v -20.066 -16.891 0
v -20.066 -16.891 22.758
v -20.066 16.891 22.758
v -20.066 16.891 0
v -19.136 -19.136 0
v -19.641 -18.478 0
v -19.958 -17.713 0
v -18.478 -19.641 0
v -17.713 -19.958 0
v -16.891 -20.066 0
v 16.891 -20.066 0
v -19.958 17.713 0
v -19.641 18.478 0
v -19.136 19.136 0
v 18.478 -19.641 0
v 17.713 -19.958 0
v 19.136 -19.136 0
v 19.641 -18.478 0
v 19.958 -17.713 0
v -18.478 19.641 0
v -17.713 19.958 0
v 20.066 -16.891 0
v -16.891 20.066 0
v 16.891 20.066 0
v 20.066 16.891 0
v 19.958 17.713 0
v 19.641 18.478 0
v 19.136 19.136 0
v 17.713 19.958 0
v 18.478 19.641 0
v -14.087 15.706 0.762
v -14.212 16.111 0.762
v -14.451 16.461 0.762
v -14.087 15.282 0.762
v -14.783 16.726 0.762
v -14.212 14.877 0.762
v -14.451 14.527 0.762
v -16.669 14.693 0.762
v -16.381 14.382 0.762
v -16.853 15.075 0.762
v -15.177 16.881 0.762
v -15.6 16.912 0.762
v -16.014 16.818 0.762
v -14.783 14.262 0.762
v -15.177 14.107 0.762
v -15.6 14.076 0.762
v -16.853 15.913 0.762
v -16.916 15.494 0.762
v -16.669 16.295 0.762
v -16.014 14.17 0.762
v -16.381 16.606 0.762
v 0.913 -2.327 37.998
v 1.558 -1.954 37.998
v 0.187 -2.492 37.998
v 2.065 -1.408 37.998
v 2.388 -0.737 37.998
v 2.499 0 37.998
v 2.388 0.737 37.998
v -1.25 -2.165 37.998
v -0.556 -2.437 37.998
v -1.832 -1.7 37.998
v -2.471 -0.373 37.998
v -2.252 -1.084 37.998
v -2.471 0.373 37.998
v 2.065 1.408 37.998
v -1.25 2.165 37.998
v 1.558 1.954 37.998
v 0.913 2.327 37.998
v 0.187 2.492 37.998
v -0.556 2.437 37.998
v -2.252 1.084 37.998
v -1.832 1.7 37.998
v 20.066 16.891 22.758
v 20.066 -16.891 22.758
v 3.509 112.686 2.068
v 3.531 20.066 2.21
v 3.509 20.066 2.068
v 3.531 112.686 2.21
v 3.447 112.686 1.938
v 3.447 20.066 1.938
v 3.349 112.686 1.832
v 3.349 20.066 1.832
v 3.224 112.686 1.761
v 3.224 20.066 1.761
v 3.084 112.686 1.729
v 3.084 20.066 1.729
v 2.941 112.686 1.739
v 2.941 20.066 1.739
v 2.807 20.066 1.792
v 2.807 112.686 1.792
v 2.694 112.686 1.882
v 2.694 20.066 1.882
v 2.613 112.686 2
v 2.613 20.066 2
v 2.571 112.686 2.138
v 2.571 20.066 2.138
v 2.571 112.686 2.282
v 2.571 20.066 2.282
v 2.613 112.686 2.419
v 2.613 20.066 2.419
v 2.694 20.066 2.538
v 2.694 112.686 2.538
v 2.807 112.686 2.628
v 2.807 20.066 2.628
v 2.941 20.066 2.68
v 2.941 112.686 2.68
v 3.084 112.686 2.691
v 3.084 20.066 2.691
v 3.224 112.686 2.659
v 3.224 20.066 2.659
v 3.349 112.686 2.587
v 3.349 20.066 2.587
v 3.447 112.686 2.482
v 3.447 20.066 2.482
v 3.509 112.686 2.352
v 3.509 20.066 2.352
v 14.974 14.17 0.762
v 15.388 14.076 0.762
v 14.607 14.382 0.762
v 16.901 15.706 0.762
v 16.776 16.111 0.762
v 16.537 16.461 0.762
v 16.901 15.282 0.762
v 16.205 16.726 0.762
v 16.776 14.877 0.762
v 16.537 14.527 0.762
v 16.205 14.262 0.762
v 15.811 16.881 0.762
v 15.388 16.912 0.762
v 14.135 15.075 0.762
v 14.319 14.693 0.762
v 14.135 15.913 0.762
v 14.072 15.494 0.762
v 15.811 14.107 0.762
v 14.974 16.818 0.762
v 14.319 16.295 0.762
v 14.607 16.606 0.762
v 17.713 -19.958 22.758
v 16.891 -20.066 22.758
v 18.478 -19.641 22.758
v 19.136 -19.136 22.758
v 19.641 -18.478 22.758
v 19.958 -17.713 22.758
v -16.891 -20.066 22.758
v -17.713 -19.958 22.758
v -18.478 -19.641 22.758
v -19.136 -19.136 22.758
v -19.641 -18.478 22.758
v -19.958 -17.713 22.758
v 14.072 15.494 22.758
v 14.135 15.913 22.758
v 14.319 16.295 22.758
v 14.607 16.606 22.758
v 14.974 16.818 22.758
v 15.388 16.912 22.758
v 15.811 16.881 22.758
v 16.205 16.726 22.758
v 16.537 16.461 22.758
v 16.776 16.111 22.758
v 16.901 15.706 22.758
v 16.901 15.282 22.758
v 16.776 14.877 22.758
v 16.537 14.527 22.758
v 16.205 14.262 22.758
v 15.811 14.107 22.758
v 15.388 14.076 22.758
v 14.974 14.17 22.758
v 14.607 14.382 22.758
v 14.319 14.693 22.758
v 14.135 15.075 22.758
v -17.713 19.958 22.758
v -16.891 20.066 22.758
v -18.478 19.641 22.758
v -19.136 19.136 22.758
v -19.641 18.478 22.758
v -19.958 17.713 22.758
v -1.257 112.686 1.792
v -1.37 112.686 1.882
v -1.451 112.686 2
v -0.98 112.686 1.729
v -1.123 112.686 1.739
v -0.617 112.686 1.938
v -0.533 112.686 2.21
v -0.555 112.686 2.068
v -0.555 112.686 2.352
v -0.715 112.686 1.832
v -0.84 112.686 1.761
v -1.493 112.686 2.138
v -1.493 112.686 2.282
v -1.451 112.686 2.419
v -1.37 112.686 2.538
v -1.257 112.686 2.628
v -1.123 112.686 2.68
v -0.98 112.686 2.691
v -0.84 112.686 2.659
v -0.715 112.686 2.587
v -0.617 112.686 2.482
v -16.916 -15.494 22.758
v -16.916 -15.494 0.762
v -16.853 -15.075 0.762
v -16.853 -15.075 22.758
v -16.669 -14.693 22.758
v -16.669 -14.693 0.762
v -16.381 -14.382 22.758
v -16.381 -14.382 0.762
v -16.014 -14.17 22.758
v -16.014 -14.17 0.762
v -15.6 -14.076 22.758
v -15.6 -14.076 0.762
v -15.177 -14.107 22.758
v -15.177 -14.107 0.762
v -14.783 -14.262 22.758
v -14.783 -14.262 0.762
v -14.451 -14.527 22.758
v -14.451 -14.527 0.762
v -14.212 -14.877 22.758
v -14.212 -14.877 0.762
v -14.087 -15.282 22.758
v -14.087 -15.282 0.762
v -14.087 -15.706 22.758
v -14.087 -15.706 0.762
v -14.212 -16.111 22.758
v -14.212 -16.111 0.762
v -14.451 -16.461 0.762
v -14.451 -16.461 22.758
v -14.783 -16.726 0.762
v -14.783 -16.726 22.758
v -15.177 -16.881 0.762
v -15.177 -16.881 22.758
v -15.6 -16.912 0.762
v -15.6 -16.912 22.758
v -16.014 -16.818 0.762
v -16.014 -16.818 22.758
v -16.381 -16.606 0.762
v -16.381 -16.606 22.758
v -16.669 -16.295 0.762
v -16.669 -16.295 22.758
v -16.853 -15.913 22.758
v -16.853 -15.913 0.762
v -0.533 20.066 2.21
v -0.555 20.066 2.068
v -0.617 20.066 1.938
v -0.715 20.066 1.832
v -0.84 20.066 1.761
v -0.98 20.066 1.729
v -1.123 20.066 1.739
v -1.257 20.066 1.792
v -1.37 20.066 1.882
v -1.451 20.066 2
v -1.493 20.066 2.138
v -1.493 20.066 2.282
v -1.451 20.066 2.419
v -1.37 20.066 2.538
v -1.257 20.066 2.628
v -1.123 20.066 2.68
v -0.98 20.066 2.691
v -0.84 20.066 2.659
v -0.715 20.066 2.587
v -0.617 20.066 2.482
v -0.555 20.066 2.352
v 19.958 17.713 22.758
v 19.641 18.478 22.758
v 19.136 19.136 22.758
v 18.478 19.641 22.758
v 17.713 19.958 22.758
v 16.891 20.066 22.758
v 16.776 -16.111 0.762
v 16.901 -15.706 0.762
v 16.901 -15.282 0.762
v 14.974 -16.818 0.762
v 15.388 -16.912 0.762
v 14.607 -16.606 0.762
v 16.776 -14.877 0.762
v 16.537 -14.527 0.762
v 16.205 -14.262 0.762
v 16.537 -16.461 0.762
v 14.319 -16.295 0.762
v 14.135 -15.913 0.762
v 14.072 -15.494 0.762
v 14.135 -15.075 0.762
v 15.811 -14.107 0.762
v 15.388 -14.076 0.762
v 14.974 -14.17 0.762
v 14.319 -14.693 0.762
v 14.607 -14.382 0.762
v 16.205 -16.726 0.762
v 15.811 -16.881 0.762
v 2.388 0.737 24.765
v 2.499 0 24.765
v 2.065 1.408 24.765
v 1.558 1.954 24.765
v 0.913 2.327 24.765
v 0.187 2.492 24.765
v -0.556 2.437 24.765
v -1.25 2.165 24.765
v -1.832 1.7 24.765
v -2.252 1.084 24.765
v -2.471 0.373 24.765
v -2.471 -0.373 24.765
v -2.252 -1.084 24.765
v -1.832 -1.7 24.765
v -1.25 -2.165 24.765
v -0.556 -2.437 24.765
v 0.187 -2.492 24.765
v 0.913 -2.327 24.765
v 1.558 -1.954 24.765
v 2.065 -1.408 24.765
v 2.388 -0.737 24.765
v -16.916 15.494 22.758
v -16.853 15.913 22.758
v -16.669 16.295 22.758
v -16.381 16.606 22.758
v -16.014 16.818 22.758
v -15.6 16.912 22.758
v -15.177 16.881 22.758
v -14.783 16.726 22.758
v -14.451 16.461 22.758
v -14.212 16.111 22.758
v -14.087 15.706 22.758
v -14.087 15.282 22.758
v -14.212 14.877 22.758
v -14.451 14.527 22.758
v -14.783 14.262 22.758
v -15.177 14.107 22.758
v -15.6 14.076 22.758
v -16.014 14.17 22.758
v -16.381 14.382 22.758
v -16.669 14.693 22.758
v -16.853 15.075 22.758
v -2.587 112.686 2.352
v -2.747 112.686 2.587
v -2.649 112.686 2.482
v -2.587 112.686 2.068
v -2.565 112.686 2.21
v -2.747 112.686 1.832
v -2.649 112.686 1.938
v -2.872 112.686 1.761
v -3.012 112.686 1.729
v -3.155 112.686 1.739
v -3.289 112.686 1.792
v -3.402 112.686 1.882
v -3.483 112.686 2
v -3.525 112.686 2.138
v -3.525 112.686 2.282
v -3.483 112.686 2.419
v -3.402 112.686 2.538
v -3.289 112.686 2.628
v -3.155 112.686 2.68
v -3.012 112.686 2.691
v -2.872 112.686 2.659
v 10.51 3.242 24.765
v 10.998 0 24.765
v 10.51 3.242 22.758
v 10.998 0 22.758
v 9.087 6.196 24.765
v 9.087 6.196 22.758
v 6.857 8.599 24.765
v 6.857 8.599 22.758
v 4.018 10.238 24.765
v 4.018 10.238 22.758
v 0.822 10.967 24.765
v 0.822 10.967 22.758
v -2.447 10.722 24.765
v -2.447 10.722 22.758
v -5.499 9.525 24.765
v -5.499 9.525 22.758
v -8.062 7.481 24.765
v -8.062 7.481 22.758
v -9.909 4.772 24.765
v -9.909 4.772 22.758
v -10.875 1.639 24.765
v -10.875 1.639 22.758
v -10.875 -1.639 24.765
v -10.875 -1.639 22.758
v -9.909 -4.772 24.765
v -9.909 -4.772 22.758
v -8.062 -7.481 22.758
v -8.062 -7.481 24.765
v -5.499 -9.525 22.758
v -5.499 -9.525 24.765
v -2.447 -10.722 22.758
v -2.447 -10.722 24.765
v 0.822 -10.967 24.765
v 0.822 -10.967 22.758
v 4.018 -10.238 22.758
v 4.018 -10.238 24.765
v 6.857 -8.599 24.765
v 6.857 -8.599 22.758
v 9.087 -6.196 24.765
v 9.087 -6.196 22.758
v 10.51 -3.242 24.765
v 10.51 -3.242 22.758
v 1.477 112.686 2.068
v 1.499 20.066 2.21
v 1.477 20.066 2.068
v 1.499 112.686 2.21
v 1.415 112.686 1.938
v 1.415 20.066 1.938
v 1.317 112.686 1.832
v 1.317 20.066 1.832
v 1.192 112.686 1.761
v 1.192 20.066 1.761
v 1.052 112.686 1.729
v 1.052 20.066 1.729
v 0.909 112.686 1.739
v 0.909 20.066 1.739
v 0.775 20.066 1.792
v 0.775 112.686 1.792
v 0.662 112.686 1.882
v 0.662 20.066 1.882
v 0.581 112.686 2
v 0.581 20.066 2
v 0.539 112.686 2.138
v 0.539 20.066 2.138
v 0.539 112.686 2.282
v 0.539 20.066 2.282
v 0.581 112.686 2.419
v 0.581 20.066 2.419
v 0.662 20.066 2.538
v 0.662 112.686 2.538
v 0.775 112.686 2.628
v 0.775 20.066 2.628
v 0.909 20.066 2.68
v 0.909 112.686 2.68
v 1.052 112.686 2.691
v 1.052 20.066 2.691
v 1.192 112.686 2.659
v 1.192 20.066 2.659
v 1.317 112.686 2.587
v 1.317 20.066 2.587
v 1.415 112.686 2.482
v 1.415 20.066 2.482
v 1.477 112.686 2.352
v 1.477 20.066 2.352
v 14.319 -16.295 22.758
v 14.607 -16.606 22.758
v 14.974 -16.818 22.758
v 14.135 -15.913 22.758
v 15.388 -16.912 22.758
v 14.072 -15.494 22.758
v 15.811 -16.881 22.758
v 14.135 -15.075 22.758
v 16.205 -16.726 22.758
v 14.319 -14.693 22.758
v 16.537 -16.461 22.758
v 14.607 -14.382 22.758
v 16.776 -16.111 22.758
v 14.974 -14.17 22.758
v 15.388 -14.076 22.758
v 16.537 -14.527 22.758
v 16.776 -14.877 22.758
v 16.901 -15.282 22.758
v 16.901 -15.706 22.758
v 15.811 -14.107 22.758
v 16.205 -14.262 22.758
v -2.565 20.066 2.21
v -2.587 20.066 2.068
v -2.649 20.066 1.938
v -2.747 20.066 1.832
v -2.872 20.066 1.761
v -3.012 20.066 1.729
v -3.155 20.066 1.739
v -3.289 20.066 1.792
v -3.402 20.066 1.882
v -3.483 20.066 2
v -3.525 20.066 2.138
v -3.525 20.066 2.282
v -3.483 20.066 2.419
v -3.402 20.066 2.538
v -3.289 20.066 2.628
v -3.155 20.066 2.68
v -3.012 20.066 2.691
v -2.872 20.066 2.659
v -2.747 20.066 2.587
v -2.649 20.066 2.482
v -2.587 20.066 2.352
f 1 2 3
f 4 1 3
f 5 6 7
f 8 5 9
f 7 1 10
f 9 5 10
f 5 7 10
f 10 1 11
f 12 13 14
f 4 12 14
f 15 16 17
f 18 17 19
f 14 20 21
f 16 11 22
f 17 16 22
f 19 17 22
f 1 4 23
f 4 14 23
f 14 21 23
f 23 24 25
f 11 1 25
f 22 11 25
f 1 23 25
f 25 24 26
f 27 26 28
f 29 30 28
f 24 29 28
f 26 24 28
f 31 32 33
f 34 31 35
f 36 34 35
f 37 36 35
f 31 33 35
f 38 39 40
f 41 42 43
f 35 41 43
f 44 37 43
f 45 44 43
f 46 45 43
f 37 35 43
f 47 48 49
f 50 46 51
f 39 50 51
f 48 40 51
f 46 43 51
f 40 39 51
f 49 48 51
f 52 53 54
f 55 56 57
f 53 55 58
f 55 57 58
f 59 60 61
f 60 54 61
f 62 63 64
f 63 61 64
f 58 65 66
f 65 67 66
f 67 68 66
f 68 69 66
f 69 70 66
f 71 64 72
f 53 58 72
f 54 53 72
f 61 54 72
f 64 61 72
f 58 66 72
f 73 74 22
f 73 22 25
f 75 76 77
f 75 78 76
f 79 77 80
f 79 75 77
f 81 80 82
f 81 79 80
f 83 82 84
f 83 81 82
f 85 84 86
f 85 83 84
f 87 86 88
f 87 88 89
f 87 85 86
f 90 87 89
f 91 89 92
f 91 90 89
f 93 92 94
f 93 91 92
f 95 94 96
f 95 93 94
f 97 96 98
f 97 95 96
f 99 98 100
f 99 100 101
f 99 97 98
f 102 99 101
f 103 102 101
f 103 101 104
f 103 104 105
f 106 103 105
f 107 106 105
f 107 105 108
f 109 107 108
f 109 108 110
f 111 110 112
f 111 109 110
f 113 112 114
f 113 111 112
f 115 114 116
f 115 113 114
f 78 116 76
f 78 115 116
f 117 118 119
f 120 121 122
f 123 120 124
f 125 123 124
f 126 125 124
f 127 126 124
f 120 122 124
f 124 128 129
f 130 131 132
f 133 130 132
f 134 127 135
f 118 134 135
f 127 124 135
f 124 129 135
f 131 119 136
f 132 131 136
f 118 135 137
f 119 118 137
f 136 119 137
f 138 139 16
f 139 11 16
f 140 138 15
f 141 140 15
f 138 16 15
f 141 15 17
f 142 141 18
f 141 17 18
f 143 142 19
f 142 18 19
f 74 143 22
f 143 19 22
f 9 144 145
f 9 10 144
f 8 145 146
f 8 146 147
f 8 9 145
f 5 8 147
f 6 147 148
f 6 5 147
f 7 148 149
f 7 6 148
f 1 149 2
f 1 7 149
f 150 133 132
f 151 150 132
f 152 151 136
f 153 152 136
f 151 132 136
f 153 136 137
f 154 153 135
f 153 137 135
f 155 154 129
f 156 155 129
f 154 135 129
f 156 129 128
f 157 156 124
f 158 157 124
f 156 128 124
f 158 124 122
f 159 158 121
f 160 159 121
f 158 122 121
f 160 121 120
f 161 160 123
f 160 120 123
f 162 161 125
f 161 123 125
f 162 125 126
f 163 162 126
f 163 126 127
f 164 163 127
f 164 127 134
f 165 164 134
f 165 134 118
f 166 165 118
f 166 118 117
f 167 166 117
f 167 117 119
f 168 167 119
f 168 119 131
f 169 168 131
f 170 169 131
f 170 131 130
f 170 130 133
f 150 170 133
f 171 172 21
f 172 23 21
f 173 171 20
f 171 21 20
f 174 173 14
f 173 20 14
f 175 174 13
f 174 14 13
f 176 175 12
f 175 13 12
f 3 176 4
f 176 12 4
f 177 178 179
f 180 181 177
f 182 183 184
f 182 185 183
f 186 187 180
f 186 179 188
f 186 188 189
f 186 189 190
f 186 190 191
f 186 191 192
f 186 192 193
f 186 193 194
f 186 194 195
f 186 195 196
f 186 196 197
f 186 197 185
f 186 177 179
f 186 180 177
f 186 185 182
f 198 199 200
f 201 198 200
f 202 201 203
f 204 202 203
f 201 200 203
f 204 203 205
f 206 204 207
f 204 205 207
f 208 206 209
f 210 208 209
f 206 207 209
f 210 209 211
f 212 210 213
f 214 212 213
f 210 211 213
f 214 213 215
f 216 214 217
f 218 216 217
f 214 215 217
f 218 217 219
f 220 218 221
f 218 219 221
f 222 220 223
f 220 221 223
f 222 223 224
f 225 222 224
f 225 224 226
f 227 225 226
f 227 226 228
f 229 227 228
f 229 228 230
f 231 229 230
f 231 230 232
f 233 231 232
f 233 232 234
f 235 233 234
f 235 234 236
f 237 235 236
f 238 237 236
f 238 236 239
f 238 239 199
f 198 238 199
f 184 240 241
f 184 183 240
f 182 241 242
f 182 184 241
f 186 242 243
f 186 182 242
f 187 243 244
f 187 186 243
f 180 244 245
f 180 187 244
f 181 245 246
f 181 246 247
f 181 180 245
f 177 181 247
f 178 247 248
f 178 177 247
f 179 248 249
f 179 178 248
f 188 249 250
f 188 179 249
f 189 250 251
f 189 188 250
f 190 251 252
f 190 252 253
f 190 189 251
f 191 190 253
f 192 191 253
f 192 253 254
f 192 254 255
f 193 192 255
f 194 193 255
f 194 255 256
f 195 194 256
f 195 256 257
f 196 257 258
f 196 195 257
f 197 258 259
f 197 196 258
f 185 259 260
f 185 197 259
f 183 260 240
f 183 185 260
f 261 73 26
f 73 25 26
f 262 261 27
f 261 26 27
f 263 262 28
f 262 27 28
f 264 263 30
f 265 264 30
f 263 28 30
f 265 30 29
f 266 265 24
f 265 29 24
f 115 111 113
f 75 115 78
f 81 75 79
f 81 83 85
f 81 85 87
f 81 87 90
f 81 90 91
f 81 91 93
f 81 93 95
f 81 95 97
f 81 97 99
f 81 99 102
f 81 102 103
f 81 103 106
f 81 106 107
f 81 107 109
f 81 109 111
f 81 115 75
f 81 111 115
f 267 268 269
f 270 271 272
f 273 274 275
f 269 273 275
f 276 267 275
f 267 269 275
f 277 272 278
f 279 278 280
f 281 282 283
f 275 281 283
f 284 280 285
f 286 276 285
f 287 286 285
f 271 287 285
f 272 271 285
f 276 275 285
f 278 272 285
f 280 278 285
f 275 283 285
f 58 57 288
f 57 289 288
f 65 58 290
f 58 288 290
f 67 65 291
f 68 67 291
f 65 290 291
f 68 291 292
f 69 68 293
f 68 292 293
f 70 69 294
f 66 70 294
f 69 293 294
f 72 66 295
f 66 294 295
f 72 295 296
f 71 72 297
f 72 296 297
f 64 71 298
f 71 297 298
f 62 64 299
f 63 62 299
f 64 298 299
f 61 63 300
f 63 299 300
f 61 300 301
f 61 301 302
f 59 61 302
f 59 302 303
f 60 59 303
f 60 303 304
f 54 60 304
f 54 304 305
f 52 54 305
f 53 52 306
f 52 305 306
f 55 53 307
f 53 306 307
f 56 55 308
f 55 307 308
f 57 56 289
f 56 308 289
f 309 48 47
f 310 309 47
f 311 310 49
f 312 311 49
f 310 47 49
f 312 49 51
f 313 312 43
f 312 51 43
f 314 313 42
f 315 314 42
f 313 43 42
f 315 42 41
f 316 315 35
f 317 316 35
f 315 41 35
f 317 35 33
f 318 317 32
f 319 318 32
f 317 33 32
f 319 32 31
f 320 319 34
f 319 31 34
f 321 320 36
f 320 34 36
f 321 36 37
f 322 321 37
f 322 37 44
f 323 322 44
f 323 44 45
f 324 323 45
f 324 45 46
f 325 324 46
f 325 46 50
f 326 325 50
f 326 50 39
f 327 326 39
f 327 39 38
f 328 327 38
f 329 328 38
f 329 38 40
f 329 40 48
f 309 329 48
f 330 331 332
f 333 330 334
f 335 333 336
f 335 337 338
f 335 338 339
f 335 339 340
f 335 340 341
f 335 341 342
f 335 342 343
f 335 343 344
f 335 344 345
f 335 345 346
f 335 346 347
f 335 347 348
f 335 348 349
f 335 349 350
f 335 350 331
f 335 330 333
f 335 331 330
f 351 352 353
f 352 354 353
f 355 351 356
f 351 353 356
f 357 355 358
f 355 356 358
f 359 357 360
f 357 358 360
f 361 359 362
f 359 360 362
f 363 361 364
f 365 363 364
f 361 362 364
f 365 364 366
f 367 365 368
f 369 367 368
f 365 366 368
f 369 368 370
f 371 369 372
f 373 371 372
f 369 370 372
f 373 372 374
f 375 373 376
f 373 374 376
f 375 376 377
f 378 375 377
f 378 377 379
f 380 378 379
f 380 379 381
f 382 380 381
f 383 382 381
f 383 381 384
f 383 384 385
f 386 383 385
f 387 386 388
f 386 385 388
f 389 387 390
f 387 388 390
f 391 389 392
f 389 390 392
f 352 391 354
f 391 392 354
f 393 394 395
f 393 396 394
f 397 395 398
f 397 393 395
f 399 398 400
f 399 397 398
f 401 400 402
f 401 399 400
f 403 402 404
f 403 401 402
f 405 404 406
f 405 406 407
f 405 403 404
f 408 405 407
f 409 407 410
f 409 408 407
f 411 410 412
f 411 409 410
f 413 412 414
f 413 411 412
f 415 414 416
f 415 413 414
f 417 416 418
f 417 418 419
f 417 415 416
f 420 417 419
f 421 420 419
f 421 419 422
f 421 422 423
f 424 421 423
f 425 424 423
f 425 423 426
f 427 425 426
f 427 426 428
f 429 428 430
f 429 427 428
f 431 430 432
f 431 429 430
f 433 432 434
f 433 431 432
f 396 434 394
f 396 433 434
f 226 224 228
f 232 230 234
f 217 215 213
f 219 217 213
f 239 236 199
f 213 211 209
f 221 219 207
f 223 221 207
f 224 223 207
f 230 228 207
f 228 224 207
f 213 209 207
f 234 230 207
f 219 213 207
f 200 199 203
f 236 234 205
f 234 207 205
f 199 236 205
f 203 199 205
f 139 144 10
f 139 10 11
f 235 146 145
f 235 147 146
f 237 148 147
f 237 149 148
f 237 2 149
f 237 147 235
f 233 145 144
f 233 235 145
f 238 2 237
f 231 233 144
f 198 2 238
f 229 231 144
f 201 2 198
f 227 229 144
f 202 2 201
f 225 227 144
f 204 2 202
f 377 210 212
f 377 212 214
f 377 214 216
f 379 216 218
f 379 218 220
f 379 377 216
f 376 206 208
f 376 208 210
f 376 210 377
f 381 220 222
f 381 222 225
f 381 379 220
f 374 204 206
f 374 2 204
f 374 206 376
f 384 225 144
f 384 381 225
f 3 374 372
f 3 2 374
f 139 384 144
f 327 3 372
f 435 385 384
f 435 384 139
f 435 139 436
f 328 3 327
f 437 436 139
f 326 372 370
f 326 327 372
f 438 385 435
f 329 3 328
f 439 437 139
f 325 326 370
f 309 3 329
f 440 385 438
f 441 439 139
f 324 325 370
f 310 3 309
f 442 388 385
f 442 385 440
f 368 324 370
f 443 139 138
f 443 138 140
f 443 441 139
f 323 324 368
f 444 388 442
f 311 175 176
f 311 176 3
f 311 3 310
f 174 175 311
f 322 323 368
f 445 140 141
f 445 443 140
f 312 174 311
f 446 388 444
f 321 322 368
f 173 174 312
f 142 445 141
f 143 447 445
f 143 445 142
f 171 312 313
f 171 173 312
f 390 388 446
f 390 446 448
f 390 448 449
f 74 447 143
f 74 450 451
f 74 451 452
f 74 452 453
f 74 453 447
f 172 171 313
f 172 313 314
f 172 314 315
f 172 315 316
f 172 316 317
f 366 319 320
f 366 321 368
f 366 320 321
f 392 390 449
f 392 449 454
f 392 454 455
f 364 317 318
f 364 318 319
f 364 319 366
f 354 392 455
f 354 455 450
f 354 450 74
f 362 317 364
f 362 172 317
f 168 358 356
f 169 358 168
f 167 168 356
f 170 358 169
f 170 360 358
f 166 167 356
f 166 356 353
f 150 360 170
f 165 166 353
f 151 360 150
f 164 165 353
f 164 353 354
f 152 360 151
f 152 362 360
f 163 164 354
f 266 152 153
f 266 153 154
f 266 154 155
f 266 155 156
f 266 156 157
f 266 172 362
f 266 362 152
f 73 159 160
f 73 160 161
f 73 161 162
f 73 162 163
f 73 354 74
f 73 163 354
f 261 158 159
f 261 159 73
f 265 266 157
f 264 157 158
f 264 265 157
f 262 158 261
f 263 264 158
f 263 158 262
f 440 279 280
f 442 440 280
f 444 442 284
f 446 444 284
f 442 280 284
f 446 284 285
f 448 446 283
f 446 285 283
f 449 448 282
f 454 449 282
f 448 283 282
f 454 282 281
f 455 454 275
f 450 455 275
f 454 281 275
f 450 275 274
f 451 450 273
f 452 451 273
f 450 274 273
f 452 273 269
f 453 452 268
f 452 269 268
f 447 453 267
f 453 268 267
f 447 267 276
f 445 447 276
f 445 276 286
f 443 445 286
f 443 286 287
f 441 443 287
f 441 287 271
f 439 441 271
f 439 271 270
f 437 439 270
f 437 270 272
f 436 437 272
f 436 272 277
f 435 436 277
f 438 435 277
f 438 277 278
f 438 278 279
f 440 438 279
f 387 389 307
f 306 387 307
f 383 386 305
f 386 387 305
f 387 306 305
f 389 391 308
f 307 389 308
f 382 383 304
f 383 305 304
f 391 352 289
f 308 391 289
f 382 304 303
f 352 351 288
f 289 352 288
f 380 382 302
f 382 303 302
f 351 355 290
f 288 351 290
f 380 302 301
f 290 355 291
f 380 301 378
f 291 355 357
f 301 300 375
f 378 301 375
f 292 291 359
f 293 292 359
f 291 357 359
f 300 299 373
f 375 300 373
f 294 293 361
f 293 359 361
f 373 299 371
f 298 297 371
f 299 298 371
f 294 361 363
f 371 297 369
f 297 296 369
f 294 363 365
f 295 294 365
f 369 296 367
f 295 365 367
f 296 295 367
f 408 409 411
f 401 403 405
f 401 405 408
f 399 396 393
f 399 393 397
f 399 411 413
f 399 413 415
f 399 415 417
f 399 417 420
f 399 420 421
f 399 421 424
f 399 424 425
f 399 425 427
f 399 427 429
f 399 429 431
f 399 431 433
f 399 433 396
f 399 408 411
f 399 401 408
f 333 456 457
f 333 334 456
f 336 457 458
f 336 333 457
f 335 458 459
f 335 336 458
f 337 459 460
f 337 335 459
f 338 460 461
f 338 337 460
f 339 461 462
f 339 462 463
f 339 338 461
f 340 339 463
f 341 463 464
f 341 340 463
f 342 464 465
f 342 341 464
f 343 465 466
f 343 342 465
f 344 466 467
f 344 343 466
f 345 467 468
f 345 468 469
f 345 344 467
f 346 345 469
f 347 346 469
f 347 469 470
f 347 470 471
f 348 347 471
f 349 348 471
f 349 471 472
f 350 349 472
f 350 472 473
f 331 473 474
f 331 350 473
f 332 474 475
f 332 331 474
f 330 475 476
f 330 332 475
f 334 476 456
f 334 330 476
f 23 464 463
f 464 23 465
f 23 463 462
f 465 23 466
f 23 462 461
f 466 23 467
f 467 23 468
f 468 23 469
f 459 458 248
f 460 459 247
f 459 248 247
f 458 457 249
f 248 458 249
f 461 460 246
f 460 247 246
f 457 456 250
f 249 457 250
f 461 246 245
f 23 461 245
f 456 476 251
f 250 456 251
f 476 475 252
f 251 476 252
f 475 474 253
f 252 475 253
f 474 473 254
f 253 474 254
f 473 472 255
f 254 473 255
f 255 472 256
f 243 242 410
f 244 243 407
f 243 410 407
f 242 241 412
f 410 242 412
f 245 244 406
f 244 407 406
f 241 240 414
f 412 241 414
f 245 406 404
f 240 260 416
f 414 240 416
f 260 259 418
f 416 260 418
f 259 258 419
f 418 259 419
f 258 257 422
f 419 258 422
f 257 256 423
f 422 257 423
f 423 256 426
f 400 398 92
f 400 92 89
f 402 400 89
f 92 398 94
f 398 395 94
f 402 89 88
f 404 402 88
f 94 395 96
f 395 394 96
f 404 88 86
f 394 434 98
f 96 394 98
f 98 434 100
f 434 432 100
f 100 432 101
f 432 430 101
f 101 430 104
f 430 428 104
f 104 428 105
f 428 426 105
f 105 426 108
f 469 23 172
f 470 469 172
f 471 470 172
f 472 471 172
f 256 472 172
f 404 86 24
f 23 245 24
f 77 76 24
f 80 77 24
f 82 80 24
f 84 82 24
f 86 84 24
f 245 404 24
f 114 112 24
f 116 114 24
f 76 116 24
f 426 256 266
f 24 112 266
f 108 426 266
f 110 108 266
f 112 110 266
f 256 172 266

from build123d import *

# Parameters (mm, degrees)
SKETCH1_W           = 40.132
SKETCH1_H           = 40.132
BOSS_EXTRUDE1_DEPTH = 22.7584
SKETCH2_W           = 0.4826
SKETCH2_H           = 92.619583511
SKETCH3_W           = 0.4826
SKETCH3_H           = 92.619583511
SKETCH4_W           = 0.4826
SKETCH4_H           = 92.619583511
SKETCH5_W           = 0.4826
SKETCH5_H           = 92.619583511
HOLE1_D             = 2.8448
HOLE1_DEPTH         = 21.9964
HOLE2_D             = 2.8448
HOLE2_DEPTH         = 21.9964
HOLE3_D             = 2.8448
HOLE3_DEPTH         = 21.9964
HOLE4_D             = 2.8448
HOLE4_DEPTH         = 21.9964
FILLET1_R           = 3.175
FILLET2_R           = 3.175
FILLET3_R           = 3.175
FILLET4_R           = 3.175


with BuildPart() as part:
    # Sketch1 → Boss-Extrude1 (new body)
    with BuildSketch(Plane.XY.offset(22.7584)):
        Rectangle(SKETCH1_W, SKETCH1_H)
    extrude(amount=-BOSS_EXTRUDE1_DEPTH)

    # Sketch2 → Revolve1 (revolve)
    with BuildSketch(Plane(origin=(0, 0, 2.2098), x_dir=(-1, 0, 0), z_dir=(0, 0, -1))):
        with Locations((2.8067, 66.375791756)):
            Rectangle(SKETCH2_W, SKETCH2_H)
    revolve(axis=Axis((-3.048, 20.066, 2.2098), (0, 1, 0)))

    # Sketch3 → Revolve2 (revolve)
    with BuildSketch(Plane(origin=(0, 0, 2.2098), x_dir=(-1, 0, 0), z_dir=(0, 0, -1))):
        with Locations((-1.2573, 66.375791756)):
            Rectangle(SKETCH3_W, SKETCH3_H)
    revolve(axis=Axis((1.016, 20.066, 2.2098), (0, 1, 0)))

    # Sketch4 → Revolve3 (revolve)
    with BuildSketch(Plane(origin=(0, 0, 2.2098), x_dir=(-1, 0, 0), z_dir=(0, 0, -1))):
        with Locations((-3.2893, 66.375791756)):
            Rectangle(SKETCH4_W, SKETCH4_H)
    revolve(axis=Axis((3.048, 20.066, 2.2098), (0, 1, 0)))

    # Sketch5 → Revolve4 (revolve)
    with BuildSketch(Plane(origin=(0, 0, 2.2098), x_dir=(-1, 0, 0), z_dir=(0, 0, -1))):
        with Locations((0.7747, 66.375791756)):
            Rectangle(SKETCH5_W, SKETCH5_H)
    revolve(axis=Axis((-1.016, 20.066, 2.2098), (0, 1, 0)))

    # Sketch6 → Revolve5 (revolve)
    with BuildSketch(Plane(origin=(0, 0, 0), x_dir=(1, 0, 0), z_dir=(0, 1, 0))):
        Polygon((10.9982, -22.7584), (0, -22.7584), (0, -37.9984), (2.49936, -37.9984), (2.49936, -24.765), (10.9982, -24.765), align=None)
    revolve(axis=Axis((0, 0, 22.7584), (0, 0, 1)))

    # Hole1
    with Locations(Plane.XY.offset(22.7584)):
        with Locations((-15.494, 15.494)):
            Hole(HOLE1_D / 2, depth=HOLE1_DEPTH)

    # Hole2
    with Locations(Plane.XY.offset(22.7584)):
        with Locations((15.494, 15.494)):
            Hole(HOLE2_D / 2, depth=HOLE2_DEPTH)

    # Hole3
    with Locations(Plane.XY.offset(22.7584)):
        with Locations((-15.494, -15.494)):
            Hole(HOLE3_D / 2, depth=HOLE3_DEPTH)

    # Hole4
    with Locations(Plane.XY.offset(22.7584)):
        with Locations((15.494, -15.494)):
            Hole(HOLE4_D / 2, depth=HOLE4_DEPTH)

    # Fillet1
    fillet1_edges = [part.edges().sort_by_distance(p)[0] for p in [
        (20.066, -20.066, 11.3792),
    ]]
    fillet(fillet1_edges, radius=FILLET1_R)

    # Fillet2
    fillet2_edges = [part.edges().sort_by_distance(p)[0] for p in [
        (-20.066, -20.066, 11.3792),
    ]]
    fillet(fillet2_edges, radius=FILLET2_R)

    # Fillet3
    fillet3_edges = [part.edges().sort_by_distance(p)[0] for p in [
        (20.066, 20.066, 11.3792),
    ]]
    fillet(fillet3_edges, radius=FILLET3_R)

    # Fillet4
    fillet4_edges = [part.edges().sort_by_distance(p)[0] for p in [
        (-20.066, 20.066, 11.3792),
    ]]
    fillet(fillet4_edges, radius=FILLET4_R)


solid = part.part
